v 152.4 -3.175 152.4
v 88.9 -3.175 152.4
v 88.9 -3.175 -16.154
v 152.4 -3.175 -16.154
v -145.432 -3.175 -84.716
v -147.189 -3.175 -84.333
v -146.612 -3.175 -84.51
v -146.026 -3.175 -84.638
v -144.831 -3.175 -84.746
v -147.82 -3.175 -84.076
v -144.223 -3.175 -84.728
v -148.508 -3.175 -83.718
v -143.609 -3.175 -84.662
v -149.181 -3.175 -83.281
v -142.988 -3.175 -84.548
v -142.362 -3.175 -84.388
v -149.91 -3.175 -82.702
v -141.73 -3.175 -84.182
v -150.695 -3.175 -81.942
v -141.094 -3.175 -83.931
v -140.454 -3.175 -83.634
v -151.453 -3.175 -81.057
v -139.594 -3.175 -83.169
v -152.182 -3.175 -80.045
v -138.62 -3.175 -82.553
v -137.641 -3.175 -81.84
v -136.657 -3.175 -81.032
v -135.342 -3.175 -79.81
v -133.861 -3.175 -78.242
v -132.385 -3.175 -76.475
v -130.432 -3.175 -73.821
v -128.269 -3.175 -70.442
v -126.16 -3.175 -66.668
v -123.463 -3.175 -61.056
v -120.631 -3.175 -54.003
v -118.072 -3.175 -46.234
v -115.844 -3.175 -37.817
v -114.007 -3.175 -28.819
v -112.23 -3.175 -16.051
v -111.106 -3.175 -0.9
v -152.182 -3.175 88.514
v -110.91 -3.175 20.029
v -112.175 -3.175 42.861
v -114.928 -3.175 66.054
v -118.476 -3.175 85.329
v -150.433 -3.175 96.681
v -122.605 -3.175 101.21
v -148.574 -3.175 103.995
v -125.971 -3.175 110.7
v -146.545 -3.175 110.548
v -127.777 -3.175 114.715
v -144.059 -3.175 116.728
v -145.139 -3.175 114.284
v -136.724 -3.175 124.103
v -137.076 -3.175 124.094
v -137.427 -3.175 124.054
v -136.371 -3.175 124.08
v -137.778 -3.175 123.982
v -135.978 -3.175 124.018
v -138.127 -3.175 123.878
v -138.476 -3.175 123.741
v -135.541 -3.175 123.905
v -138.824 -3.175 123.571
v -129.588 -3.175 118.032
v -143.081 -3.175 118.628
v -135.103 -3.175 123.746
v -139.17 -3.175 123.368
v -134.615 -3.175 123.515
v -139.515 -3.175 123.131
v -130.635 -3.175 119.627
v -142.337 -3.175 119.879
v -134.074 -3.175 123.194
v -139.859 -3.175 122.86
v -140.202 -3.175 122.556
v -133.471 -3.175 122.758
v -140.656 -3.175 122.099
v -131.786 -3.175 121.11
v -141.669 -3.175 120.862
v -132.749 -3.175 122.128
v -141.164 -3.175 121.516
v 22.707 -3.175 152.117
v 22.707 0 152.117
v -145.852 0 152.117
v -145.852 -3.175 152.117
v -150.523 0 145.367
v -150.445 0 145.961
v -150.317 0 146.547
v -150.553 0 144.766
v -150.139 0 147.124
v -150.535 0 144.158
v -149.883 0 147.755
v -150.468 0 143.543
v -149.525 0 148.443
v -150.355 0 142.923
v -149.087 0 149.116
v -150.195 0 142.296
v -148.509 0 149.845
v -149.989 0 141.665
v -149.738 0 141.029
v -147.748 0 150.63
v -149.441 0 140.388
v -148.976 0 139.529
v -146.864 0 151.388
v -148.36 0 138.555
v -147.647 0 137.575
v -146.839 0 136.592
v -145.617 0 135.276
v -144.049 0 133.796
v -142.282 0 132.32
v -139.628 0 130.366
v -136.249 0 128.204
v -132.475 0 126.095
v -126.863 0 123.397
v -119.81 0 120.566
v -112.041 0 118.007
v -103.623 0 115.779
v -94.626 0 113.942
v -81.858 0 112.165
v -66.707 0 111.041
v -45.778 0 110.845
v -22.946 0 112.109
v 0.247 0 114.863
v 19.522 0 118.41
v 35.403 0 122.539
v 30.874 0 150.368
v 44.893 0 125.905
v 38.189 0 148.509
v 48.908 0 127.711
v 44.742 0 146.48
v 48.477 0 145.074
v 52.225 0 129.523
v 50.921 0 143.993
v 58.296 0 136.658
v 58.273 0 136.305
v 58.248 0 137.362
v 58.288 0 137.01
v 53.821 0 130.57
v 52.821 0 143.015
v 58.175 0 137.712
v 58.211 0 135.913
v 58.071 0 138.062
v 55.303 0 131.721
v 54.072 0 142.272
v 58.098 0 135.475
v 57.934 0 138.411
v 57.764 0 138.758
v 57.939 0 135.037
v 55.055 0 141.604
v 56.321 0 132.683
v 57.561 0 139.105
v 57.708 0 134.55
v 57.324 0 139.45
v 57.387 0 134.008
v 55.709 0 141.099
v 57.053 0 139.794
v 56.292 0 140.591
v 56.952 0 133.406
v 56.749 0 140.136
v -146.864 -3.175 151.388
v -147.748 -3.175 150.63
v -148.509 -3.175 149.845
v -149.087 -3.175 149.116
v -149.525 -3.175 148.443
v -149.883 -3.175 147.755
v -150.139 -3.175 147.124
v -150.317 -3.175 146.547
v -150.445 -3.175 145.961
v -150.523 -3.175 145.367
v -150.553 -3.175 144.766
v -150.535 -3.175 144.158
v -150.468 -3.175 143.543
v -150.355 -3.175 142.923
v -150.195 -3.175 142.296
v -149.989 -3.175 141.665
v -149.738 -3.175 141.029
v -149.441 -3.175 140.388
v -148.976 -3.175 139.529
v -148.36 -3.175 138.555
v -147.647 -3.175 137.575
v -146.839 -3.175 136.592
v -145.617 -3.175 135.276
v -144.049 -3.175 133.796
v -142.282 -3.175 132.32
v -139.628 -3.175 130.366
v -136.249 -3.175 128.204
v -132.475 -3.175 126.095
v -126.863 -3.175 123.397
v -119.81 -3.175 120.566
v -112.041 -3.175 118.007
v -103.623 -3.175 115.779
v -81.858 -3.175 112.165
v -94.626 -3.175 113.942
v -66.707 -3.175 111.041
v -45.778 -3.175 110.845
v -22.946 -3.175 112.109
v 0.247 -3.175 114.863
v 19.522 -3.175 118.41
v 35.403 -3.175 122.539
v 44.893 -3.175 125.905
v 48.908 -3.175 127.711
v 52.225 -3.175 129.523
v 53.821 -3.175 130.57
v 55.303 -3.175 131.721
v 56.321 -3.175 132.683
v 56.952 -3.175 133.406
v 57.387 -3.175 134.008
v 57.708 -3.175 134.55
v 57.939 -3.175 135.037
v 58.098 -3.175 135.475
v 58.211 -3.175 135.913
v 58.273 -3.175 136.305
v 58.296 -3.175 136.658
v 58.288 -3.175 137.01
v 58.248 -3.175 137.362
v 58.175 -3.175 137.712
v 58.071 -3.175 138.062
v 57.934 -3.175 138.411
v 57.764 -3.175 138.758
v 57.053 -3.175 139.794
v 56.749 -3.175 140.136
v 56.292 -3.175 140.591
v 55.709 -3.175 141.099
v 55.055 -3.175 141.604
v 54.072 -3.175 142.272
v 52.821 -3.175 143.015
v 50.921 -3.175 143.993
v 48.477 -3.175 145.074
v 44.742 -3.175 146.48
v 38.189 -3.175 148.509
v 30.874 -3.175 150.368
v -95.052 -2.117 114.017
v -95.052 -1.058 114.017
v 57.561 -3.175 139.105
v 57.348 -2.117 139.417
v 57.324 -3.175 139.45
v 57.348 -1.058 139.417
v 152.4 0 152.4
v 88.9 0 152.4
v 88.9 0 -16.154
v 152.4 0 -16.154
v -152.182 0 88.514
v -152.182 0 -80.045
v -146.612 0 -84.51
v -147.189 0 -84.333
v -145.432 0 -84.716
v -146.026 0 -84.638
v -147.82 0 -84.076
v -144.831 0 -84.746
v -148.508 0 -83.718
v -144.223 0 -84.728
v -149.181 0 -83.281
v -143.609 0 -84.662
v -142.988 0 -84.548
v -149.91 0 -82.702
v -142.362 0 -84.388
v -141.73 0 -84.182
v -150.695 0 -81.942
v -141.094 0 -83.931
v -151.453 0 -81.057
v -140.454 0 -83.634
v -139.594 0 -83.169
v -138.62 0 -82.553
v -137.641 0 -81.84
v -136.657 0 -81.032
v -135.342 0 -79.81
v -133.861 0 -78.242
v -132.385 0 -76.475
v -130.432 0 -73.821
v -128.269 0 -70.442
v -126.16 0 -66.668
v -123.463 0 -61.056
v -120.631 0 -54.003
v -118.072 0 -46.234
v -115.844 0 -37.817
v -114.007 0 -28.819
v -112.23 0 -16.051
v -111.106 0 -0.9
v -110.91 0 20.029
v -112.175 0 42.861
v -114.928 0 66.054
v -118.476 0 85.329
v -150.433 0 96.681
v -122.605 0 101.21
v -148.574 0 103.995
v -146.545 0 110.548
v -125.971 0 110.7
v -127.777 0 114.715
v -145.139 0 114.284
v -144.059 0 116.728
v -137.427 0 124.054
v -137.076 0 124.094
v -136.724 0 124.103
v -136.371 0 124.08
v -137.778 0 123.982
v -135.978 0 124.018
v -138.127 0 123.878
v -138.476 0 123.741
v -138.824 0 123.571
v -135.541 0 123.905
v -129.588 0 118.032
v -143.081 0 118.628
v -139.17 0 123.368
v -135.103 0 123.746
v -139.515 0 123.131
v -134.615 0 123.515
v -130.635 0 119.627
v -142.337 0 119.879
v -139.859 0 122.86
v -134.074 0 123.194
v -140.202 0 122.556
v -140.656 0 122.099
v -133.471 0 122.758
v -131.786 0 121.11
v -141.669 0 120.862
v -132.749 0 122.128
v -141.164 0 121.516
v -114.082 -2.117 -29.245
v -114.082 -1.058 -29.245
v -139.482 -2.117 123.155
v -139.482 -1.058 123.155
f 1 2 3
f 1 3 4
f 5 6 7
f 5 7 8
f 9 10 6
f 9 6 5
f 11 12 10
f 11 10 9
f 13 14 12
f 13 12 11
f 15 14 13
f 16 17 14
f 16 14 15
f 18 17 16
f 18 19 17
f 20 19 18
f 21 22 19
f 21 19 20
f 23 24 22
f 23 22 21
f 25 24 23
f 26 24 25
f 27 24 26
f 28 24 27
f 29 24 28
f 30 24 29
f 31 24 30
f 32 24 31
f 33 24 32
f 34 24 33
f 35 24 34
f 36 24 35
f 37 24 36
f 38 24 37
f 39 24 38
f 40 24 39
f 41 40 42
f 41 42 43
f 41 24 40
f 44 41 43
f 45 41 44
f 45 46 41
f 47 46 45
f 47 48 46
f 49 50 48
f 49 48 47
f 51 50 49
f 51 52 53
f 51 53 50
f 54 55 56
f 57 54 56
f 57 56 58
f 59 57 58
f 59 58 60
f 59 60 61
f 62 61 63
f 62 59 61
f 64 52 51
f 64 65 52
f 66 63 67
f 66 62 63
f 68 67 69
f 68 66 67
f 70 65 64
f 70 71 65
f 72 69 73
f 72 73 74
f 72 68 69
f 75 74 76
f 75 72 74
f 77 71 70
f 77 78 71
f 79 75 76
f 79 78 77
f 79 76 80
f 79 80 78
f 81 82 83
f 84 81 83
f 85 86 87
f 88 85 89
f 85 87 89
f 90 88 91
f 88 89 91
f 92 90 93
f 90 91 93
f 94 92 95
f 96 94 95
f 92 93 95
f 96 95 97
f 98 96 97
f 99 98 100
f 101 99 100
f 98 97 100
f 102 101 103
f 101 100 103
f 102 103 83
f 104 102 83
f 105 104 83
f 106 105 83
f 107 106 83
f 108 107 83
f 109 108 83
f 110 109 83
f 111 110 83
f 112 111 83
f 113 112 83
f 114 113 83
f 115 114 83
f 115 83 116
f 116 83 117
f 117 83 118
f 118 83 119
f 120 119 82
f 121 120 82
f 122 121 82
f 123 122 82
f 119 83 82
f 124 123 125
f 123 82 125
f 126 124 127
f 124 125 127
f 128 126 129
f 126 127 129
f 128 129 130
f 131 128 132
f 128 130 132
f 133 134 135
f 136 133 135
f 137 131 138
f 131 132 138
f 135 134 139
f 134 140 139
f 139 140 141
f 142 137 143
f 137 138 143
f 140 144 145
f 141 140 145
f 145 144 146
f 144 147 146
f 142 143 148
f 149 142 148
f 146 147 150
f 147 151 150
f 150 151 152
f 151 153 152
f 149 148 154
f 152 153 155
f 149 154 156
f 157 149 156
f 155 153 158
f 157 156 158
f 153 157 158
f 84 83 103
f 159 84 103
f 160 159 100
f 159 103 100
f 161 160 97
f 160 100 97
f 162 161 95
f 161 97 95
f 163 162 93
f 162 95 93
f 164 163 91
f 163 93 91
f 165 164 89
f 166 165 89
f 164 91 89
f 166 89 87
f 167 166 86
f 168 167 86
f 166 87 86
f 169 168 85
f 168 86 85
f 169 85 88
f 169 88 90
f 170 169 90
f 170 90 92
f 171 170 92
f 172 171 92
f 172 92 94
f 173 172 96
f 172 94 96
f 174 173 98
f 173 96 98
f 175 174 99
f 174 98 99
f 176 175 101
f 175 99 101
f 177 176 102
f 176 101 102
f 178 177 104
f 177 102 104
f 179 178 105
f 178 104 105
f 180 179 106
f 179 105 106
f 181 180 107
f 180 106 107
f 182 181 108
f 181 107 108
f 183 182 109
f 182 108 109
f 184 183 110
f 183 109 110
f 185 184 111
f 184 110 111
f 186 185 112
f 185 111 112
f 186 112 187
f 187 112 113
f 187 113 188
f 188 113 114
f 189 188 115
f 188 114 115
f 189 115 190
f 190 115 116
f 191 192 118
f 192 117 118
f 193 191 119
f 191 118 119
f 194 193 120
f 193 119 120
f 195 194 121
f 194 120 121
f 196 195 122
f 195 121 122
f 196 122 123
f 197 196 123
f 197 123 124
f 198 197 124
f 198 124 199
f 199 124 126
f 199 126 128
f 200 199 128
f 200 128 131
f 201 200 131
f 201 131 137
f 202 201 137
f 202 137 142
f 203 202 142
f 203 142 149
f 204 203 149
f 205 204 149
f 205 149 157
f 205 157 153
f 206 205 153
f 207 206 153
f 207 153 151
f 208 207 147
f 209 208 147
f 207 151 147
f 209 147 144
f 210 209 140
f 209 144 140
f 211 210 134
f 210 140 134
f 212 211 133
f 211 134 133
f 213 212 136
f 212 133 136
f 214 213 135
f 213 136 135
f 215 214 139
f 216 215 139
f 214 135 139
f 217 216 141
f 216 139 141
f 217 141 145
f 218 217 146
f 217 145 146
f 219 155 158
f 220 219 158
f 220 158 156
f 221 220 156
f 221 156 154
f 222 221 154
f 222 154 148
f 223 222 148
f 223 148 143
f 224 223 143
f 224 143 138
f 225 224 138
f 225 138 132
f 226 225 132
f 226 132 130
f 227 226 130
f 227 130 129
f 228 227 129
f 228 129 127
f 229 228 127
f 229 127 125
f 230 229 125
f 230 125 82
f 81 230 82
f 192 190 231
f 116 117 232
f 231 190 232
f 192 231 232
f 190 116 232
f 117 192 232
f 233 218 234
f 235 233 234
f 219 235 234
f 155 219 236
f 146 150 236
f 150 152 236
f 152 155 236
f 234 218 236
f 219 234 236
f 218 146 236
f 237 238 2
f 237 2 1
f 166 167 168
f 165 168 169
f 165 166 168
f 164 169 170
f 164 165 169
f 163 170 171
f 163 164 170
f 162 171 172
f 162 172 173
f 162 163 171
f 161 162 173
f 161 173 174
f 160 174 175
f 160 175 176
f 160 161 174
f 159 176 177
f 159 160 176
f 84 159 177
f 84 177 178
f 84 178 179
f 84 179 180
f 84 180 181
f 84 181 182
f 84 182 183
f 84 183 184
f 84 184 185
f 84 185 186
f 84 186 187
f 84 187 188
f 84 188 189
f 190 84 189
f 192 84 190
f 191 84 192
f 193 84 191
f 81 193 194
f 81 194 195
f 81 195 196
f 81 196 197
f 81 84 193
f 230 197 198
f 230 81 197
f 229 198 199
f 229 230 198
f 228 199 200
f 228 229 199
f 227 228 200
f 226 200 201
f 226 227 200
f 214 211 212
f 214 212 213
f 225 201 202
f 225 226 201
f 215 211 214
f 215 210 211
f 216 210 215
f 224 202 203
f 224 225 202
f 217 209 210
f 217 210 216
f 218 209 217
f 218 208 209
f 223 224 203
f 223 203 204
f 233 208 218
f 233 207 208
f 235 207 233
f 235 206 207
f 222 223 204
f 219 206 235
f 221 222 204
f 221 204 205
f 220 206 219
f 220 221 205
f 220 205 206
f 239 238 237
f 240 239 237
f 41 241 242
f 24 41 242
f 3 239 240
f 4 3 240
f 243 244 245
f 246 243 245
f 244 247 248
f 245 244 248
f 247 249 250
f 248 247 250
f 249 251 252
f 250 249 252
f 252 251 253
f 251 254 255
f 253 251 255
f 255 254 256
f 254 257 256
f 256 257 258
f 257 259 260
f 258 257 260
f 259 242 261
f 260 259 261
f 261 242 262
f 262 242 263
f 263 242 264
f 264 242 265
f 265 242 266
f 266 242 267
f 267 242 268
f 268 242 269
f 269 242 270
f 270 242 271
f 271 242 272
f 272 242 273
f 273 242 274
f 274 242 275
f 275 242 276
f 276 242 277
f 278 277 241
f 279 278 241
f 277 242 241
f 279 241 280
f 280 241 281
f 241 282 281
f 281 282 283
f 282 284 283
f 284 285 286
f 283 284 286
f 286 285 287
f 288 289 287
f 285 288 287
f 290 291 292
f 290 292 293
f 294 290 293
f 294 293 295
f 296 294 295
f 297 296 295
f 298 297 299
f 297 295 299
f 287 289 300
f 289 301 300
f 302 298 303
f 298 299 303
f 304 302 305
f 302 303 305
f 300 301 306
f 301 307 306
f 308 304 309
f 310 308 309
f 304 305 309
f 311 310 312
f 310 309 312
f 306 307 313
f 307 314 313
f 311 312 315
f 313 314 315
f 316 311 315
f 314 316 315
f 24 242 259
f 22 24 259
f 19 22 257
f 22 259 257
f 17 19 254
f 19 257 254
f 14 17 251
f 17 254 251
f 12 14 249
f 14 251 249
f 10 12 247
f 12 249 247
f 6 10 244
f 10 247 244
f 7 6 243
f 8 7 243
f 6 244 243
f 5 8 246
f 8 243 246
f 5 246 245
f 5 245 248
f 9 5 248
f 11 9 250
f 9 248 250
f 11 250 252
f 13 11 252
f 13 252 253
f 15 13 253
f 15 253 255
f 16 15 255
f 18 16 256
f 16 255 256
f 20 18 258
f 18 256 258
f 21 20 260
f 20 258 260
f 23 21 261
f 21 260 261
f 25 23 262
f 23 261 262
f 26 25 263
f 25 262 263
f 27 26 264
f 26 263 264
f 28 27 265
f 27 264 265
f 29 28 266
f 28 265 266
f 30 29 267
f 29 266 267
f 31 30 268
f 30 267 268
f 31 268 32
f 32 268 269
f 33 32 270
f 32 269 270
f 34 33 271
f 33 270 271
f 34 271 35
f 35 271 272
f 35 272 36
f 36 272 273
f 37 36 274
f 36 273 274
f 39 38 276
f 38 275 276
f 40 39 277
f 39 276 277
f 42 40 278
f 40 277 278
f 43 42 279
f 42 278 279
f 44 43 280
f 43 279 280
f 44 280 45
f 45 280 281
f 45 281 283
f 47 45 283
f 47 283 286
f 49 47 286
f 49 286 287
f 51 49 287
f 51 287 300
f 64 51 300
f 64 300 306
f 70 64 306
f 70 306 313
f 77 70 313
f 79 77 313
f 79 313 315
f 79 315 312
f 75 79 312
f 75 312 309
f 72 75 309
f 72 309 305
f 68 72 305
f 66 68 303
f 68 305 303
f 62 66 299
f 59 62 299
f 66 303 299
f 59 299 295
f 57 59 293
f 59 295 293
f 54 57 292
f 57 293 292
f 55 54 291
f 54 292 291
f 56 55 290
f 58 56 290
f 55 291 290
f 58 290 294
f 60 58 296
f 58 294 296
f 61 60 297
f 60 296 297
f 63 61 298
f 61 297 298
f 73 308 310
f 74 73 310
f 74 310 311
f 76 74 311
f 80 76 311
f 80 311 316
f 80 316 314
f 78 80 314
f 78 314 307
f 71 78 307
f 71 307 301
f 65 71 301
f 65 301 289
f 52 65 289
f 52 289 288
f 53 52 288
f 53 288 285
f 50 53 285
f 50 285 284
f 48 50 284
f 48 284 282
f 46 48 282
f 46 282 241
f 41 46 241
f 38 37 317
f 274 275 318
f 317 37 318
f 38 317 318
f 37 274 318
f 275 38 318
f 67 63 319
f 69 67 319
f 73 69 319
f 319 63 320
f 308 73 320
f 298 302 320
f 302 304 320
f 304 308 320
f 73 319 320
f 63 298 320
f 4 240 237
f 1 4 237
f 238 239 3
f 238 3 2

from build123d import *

# Parameters (mm, degrees)
F0_W     = 63.5
F0_H     = 168.5544
F1_DEPTH = 3.175


# Not quite as in the source:
# - a length typed as a fraction of an inch, garbled in the dataset ("3 / 203.2 mm" for 3/8 in), is restored
# - a feature names something its author has since deleted; it is built from what else it names


with BuildPart() as f1:
    # F0 (on Front) → F1 (new body)
    with BuildSketch(Plane.XZ):
        with Locations((120.65, 68.1228)):
            Rectangle(F0_W, F0_H)
    extrude(amount=F1_DEPTH)


with BuildPart() as f1b:
    # F0 (on Front) → F1, piece 2 (new body)
    with BuildSketch(Plane.XZ):
        with BuildLine():
            add(Edge.make_bspline(
                [(-145.852143538, 152.1171118736), (-161.6387986112, 141.6337447271), (-95.7451417453, 89.5280224527), (98.5891023928, 129.2431554146), (40.7846440978, 148.5452015878), (22.7073728104, 152.1171118736)],
                knots=[0, 0, 0, 0, 0.2298618019, 0.5884097433, 0.6935771532, 0.6935771532, 0.6935771532, 0.6935771532], degree=3))
            Line((22.7073728104, 152.1171118736), (-145.852143538, 152.1171118736))
        make_face()
    extrude(amount=F1_DEPTH)


with BuildPart() as f1c:
    # F0 (on Front) → F1, piece 3 (new body)
    with BuildSketch(Plane.XZ):
        with BuildLine():
            Line((-152.1824385643, 88.5141490955), (-152.1824385643, -80.0453672528))
            add(Edge.make_bspline(
                [(-152.1824385643, -80.0453672528), (-141.6990714177, -95.832022326), (-89.5933491434, -29.9383654601), (-129.3084821052, 164.395878678), (-148.6105282784, 106.5914203829), (-152.1824385643, 88.5141490955)],
                knots=[0, 0, 0, 0, 0.2298618019, 0.5884097433, 0.6935771532, 0.6935771532, 0.6935771532, 0.6935771532], degree=3))
        make_face()
    extrude(amount=F1_DEPTH)


solid = Compound([f1.part, f1b.part, f1c.part])
